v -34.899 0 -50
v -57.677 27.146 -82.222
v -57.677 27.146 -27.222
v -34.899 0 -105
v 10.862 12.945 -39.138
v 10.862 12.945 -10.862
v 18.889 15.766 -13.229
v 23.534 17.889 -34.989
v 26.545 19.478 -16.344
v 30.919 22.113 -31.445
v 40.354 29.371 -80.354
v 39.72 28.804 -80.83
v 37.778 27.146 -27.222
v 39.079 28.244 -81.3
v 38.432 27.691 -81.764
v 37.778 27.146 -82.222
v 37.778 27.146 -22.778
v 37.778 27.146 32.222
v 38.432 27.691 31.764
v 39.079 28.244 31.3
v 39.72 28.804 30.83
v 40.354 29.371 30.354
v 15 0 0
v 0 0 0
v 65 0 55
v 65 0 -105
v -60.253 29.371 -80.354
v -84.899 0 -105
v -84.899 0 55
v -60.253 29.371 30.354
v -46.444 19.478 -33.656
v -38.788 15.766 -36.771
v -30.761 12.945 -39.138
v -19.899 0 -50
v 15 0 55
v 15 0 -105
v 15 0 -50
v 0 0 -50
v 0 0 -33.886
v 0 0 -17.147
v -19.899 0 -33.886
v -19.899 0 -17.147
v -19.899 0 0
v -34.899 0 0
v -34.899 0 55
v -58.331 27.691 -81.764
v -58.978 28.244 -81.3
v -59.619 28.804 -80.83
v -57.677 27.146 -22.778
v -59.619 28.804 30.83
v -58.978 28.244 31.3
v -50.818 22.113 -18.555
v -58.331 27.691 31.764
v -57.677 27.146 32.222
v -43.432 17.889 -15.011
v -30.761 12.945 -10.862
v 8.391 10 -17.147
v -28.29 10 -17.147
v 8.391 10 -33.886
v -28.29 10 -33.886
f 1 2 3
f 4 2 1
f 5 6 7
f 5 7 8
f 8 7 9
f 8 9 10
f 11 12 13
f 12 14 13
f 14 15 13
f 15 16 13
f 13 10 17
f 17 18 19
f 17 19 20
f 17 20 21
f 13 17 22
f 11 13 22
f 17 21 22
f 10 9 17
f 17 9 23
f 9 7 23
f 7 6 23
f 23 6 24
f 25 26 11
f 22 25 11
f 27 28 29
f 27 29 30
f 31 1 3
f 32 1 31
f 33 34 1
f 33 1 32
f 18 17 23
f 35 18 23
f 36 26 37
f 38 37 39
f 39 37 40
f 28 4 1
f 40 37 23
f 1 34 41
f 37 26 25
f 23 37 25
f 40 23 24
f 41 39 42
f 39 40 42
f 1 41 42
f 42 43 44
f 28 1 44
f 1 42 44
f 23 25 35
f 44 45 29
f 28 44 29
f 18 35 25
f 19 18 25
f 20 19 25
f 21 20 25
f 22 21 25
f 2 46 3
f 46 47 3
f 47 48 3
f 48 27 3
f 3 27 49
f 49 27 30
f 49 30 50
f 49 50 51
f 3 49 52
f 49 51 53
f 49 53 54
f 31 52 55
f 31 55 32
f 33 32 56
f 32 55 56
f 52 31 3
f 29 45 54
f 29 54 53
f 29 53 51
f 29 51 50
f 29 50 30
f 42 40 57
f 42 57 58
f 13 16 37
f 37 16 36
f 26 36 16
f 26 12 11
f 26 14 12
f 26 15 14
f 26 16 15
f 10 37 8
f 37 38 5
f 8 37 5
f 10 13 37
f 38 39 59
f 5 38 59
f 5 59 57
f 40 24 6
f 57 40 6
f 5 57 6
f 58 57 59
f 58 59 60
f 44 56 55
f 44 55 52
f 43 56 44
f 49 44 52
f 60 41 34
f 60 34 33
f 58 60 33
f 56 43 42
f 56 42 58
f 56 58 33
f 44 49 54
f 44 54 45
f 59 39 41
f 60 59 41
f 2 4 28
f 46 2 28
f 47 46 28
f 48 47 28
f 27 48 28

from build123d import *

# Parameters (mm, degrees)
BOSS_EXTRUDE1_START       = -105
BOSS_EXTRUDE1_DEPTH       = 160
BOSS_EXTRUDE1_2_DEPTH     = 40
BOSS_EXTRUDE1_START_2     = -20
BOSS_EXTRUDE1_3_OUTLINE_W = 48
BOSS_EXTRUDE1_3_OUTLINE_H = 147
BOSS_EXTRUDE1_3_DEPTH     = 20
BOSS_EXTRUDE1_START_3     = 42.132444372
BOSS_EXTRUDE1_4_OUTLINE_W = 52
BOSS_EXTRUDE1_4_OUTLINE_H = 116
BOSS_EXTRUDE1_4_DEPTH     = 19.867555628
BOSS_EXTRUDE1_START_4     = 80.434666527
BOSS_EXTRUDE1_5_OUTLINE_W = 52
BOSS_EXTRUDE1_5_OUTLINE_H = 117
BOSS_EXTRUDE1_5_DEPTH     = 20.565333473
SKETCH2_W                 = 21.285197014
SKETCH2_H                 = 16.738844255
BOSS_EXTRUDE2_DEPTH       = 10
SKETCH3_R                 = 75
CUT_EXTRUDE1_DEPTH        = 95


with BuildPart() as part:
    # Boss-Extrude1: read off the stored shape, not the designer's step
    # Boss-Extrude1 outline → Boss-Extrude1 (new body)
    with BuildSketch(Plane.XY.offset(BOSS_EXTRUDE1_START)):
        Polygon((65, 0), (40, 29.793839815), (15, 0), align=None)
    extrude(amount=BOSS_EXTRUDE1_DEPTH)

    # Boss-Extrude1 2 outline → Boss-Extrude1 2 (add)
    with BuildSketch(Plane.YZ):
        Polygon((0, -50), (29.793839815, -25), (0, 0), align=None)
    extrude(amount=BOSS_EXTRUDE1_2_DEPTH)

    # Boss-Extrude1 3 outline → Boss-Extrude1 3 (cut)
    with BuildSketch(Plane(origin=(0, 0, 0), x_dir=(0.6427876096865404, 0.7660444431189772, 0), z_dir=(0.7660444431189772, -0.6427876096865403, 0)).offset(BOSS_EXTRUDE1_START_2)):
        with Locations((22, -24.5)):
            Rectangle(BOSS_EXTRUDE1_3_OUTLINE_W, BOSS_EXTRUDE1_3_OUTLINE_H)
    extrude(amount=BOSS_EXTRUDE1_3_DEPTH, mode=Mode.SUBTRACT)

    # Boss-Extrude1 4 outline → Boss-Extrude1 4 (cut)
    with BuildSketch(Plane(origin=(0, 0, 0), x_dir=(1, 0, 0), z_dir=(0, 0.6427876096865403, 0.7660444431189772)).offset(BOSS_EXTRUDE1_START_3)):
        with Locations((40, 21)):
            Rectangle(BOSS_EXTRUDE1_4_OUTLINE_W, BOSS_EXTRUDE1_4_OUTLINE_H)
    extrude(amount=BOSS_EXTRUDE1_4_DEPTH, mode=Mode.SUBTRACT)

    # Boss-Extrude1 5 outline → Boss-Extrude1 5 (cut)
    with BuildSketch(Plane(origin=(0, 0, 0), x_dir=(1, 0, 0), z_dir=(0, 0.6427876096865403, -0.7660444431189772)).offset(BOSS_EXTRUDE1_START_4)):
        with Locations((40, 10.5)):
            Rectangle(BOSS_EXTRUDE1_5_OUTLINE_W, BOSS_EXTRUDE1_5_OUTLINE_H)
    extrude(amount=BOSS_EXTRUDE1_5_DEPTH, mode=Mode.SUBTRACT)

    # Sketch2 → Boss-Extrude2 (add)
    with BuildSketch(Plane.XZ):
        with Locations((0.693235287, -25.516630996)):
            Rectangle(SKETCH2_W, SKETCH2_H)
    extrude(amount=-BOSS_EXTRUDE2_DEPTH)

    # Mirror8: part across plane


with BuildPart() as part_1:
    add(part.part)
    add(part.part.mirror(Plane(origin=(-9.94936322, 10, -17.147208868), x_dir=(0, 0, 1), z_dir=(-1, 0, 0))))

    # Sketch3 → Cut-Extrude1 (cut, symmetric)
    with BuildSketch(Plane.XY):
        with Locations((-9.94936322, 85)):
            Circle(SKETCH3_R)
    extrude(amount=CUT_EXTRUDE1_DEPTH, both=True, mode=Mode.SUBTRACT)


solid = part_1.part
